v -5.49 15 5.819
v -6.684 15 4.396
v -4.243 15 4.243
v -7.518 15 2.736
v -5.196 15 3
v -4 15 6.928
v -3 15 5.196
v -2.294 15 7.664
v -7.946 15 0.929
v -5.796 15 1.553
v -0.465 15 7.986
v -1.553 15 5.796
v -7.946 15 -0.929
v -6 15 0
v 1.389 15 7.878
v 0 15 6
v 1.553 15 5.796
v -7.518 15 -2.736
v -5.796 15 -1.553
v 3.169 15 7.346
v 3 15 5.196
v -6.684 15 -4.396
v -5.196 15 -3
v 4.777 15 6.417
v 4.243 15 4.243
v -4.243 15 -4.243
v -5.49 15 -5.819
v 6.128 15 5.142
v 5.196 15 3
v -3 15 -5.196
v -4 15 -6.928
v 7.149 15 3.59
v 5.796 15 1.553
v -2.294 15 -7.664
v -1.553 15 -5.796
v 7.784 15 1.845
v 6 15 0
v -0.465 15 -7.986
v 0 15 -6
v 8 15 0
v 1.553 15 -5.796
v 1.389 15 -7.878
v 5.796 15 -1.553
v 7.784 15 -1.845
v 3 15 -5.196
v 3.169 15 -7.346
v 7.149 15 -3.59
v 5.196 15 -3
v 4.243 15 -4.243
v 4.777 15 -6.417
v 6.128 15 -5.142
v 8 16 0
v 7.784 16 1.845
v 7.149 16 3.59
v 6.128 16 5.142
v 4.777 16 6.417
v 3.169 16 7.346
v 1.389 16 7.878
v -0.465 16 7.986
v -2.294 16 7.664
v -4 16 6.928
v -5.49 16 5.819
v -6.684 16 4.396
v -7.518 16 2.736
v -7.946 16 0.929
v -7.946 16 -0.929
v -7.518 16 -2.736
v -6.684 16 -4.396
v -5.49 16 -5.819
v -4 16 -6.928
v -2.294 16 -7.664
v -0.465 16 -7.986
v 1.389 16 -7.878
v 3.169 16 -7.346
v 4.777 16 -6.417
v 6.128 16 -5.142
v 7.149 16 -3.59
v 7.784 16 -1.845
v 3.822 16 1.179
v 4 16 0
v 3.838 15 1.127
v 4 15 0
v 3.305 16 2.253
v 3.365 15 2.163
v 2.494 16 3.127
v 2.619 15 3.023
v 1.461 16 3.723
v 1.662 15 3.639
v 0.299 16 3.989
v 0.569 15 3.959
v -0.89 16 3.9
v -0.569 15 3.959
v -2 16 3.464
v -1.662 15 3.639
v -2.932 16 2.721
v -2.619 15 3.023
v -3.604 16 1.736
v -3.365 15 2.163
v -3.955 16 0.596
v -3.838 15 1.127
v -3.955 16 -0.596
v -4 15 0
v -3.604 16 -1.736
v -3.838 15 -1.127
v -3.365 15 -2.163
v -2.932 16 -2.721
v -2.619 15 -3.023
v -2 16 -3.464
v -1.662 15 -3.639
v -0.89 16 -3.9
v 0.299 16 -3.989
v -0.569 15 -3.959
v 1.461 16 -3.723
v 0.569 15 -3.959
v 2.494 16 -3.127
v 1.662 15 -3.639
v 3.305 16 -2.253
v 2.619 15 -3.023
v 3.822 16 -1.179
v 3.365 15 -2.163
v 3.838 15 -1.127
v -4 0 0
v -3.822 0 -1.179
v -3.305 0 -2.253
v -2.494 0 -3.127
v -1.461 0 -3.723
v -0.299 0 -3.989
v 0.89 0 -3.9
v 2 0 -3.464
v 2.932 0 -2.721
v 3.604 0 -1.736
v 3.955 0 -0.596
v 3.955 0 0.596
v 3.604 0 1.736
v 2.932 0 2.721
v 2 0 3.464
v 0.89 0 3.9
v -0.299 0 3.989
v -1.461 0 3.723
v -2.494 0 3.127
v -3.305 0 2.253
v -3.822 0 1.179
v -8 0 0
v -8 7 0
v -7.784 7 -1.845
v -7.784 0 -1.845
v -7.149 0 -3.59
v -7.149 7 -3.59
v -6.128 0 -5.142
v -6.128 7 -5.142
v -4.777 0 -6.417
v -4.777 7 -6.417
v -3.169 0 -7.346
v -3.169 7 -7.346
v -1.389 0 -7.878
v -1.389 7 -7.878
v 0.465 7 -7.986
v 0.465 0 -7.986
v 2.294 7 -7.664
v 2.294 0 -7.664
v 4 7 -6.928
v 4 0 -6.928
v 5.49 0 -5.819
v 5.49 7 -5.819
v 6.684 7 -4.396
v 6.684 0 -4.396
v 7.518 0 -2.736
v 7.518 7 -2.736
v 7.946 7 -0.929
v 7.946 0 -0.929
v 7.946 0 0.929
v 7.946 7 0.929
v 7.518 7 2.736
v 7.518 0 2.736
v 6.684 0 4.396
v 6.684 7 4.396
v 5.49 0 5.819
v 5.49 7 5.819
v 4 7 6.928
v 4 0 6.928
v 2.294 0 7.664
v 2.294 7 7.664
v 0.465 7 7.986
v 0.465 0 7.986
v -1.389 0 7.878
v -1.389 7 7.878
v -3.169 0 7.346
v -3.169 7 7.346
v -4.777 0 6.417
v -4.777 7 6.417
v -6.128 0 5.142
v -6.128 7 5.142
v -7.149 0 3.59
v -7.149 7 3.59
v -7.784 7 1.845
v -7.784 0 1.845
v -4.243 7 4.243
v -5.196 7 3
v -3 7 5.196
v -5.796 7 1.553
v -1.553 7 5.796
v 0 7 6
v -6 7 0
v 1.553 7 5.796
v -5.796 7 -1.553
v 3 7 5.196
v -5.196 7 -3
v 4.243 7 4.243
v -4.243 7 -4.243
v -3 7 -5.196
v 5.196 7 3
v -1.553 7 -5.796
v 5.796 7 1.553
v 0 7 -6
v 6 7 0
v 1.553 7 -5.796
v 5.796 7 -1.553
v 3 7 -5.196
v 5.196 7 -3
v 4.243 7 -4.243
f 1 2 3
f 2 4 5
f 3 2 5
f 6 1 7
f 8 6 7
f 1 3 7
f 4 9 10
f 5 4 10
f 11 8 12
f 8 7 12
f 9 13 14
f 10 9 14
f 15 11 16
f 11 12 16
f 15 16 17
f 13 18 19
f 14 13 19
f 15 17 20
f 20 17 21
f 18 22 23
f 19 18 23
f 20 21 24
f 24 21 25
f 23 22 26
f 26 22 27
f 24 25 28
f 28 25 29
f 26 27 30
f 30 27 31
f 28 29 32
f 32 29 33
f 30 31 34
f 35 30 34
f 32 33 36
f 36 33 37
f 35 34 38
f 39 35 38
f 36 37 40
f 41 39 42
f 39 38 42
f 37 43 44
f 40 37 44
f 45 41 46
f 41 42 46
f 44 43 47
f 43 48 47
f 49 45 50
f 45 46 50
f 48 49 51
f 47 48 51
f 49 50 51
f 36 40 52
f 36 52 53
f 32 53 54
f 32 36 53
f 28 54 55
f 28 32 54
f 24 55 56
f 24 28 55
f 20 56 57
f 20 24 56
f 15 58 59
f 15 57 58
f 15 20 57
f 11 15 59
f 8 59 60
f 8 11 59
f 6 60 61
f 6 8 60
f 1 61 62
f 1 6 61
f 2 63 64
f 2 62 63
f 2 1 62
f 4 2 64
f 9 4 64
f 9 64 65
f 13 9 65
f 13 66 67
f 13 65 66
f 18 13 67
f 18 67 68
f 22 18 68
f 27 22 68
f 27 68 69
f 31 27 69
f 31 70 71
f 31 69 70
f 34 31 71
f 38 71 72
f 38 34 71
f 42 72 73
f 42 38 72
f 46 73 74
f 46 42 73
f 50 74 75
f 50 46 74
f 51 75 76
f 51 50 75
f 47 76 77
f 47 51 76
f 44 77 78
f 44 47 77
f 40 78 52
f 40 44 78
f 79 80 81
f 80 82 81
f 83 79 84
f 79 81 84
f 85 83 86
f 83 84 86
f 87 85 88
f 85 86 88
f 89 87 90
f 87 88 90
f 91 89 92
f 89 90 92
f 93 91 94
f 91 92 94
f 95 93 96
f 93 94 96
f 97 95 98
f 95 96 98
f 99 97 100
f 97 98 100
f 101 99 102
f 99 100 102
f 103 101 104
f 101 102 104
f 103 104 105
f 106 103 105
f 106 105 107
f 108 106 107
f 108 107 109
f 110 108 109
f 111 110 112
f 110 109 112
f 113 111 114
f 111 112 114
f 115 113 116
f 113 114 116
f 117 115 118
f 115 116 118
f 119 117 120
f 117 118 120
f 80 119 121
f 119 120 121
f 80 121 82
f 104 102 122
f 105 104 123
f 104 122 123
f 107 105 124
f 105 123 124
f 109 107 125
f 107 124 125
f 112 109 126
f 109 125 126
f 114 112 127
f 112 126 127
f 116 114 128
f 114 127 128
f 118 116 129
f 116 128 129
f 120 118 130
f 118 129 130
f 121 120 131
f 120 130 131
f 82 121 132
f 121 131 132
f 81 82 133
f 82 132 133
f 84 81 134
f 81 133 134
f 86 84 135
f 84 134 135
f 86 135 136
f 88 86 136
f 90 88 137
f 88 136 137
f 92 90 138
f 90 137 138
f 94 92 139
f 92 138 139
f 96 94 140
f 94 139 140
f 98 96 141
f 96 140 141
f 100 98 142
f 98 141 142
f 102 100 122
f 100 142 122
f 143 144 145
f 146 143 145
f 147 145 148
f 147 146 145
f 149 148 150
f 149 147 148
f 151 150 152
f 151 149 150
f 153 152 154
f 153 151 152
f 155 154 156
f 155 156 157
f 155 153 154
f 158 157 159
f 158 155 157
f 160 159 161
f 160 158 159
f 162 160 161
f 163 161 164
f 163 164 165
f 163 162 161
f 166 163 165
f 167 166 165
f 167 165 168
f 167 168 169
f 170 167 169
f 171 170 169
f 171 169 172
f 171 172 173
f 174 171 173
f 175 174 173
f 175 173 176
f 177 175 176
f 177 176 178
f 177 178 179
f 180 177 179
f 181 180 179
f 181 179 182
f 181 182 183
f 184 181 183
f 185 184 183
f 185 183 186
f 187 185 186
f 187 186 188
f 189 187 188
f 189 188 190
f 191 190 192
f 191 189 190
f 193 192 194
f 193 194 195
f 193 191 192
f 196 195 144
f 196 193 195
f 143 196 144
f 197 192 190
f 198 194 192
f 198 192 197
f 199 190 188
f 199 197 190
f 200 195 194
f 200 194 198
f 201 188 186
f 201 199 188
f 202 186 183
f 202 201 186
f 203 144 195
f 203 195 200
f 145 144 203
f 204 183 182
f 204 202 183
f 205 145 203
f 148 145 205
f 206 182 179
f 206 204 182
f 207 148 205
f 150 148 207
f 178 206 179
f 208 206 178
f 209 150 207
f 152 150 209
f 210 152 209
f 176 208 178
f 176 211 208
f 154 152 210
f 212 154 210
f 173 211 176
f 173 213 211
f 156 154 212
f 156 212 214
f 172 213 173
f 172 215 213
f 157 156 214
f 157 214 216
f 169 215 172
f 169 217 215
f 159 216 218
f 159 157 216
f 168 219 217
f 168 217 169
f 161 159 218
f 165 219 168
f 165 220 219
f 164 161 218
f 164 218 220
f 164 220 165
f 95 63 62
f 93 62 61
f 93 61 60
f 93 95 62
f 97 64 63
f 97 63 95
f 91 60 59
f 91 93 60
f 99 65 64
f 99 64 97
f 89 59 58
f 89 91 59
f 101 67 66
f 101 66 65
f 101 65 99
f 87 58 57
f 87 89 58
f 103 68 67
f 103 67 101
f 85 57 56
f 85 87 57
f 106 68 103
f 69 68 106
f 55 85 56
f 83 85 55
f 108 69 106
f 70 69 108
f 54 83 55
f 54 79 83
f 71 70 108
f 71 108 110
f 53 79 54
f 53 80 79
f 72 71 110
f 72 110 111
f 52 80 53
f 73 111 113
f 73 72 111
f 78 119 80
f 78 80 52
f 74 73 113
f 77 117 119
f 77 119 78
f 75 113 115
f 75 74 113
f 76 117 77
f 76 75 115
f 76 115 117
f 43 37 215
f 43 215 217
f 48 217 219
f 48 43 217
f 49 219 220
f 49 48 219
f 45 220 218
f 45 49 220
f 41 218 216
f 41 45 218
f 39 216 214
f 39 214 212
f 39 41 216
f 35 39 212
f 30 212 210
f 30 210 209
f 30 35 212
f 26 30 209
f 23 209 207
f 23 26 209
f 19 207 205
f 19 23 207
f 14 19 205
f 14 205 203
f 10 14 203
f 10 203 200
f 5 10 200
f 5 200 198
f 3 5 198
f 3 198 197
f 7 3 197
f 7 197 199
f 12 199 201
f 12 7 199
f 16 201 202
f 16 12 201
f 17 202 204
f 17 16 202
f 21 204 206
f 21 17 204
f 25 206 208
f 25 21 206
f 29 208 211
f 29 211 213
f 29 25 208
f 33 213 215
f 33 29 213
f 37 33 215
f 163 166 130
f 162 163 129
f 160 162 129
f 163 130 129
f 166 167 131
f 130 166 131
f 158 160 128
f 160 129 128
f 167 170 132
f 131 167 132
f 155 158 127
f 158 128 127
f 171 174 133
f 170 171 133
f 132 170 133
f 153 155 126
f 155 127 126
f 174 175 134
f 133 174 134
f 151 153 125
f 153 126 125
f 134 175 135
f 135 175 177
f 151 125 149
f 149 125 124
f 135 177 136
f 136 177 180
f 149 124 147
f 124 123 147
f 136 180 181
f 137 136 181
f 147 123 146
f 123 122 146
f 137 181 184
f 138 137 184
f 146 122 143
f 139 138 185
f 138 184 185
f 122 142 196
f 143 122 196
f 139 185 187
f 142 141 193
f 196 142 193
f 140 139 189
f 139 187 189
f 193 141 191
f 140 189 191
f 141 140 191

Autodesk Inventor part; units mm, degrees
ref_plane "YZ Plane" through (0, 0, 0) normal (1, 0, 0) x (0, 1, 0)
ref_plane "XZ Plane" through (0, 0, 0) normal (0, 1, 0) x (-1, 0, 0)
ref_plane "XY Plane" through (0, 0, 0) normal (0, 0, 1) x (1, 0, 0)
sketch "Sketch1" plane through (0, 0, 0) normal (0, 1, 0) x (-1, 0, 0)
  circle A0 centre (0, 0) radius 8
  circle A1 centre (0, 0) radius 4
  dimension "d0" = 16
  dimension "d1" = 8
extrude "Extrusion1" add sketch "Sketch1" along normal blind 15
sketch "Sketch2" plane through (0, 15, 0) normal (0, 1, 0) x (1, 0, 0)
  circle A0 centre (0, 0) radius 8 projected
  circle A1 centre (0, 0) radius 6
  dimension "d4" = 12
extrude "Extrusion2" cut sketch "Sketch2" against normal blind 8
sketch "Sketch3" plane through (0, 15, 0) normal (0, 1, 0) x (1, 0, 0)
  circle A0 centre (0, 0) radius 4 projected
  circle A1 centre (0, 0) radius 8
  dimension "d7" = 16
extrude "Extrusion3" add sketch "Sketch3" along normal blind 1
properties part number "Timping Pully" material "Aluminum"
